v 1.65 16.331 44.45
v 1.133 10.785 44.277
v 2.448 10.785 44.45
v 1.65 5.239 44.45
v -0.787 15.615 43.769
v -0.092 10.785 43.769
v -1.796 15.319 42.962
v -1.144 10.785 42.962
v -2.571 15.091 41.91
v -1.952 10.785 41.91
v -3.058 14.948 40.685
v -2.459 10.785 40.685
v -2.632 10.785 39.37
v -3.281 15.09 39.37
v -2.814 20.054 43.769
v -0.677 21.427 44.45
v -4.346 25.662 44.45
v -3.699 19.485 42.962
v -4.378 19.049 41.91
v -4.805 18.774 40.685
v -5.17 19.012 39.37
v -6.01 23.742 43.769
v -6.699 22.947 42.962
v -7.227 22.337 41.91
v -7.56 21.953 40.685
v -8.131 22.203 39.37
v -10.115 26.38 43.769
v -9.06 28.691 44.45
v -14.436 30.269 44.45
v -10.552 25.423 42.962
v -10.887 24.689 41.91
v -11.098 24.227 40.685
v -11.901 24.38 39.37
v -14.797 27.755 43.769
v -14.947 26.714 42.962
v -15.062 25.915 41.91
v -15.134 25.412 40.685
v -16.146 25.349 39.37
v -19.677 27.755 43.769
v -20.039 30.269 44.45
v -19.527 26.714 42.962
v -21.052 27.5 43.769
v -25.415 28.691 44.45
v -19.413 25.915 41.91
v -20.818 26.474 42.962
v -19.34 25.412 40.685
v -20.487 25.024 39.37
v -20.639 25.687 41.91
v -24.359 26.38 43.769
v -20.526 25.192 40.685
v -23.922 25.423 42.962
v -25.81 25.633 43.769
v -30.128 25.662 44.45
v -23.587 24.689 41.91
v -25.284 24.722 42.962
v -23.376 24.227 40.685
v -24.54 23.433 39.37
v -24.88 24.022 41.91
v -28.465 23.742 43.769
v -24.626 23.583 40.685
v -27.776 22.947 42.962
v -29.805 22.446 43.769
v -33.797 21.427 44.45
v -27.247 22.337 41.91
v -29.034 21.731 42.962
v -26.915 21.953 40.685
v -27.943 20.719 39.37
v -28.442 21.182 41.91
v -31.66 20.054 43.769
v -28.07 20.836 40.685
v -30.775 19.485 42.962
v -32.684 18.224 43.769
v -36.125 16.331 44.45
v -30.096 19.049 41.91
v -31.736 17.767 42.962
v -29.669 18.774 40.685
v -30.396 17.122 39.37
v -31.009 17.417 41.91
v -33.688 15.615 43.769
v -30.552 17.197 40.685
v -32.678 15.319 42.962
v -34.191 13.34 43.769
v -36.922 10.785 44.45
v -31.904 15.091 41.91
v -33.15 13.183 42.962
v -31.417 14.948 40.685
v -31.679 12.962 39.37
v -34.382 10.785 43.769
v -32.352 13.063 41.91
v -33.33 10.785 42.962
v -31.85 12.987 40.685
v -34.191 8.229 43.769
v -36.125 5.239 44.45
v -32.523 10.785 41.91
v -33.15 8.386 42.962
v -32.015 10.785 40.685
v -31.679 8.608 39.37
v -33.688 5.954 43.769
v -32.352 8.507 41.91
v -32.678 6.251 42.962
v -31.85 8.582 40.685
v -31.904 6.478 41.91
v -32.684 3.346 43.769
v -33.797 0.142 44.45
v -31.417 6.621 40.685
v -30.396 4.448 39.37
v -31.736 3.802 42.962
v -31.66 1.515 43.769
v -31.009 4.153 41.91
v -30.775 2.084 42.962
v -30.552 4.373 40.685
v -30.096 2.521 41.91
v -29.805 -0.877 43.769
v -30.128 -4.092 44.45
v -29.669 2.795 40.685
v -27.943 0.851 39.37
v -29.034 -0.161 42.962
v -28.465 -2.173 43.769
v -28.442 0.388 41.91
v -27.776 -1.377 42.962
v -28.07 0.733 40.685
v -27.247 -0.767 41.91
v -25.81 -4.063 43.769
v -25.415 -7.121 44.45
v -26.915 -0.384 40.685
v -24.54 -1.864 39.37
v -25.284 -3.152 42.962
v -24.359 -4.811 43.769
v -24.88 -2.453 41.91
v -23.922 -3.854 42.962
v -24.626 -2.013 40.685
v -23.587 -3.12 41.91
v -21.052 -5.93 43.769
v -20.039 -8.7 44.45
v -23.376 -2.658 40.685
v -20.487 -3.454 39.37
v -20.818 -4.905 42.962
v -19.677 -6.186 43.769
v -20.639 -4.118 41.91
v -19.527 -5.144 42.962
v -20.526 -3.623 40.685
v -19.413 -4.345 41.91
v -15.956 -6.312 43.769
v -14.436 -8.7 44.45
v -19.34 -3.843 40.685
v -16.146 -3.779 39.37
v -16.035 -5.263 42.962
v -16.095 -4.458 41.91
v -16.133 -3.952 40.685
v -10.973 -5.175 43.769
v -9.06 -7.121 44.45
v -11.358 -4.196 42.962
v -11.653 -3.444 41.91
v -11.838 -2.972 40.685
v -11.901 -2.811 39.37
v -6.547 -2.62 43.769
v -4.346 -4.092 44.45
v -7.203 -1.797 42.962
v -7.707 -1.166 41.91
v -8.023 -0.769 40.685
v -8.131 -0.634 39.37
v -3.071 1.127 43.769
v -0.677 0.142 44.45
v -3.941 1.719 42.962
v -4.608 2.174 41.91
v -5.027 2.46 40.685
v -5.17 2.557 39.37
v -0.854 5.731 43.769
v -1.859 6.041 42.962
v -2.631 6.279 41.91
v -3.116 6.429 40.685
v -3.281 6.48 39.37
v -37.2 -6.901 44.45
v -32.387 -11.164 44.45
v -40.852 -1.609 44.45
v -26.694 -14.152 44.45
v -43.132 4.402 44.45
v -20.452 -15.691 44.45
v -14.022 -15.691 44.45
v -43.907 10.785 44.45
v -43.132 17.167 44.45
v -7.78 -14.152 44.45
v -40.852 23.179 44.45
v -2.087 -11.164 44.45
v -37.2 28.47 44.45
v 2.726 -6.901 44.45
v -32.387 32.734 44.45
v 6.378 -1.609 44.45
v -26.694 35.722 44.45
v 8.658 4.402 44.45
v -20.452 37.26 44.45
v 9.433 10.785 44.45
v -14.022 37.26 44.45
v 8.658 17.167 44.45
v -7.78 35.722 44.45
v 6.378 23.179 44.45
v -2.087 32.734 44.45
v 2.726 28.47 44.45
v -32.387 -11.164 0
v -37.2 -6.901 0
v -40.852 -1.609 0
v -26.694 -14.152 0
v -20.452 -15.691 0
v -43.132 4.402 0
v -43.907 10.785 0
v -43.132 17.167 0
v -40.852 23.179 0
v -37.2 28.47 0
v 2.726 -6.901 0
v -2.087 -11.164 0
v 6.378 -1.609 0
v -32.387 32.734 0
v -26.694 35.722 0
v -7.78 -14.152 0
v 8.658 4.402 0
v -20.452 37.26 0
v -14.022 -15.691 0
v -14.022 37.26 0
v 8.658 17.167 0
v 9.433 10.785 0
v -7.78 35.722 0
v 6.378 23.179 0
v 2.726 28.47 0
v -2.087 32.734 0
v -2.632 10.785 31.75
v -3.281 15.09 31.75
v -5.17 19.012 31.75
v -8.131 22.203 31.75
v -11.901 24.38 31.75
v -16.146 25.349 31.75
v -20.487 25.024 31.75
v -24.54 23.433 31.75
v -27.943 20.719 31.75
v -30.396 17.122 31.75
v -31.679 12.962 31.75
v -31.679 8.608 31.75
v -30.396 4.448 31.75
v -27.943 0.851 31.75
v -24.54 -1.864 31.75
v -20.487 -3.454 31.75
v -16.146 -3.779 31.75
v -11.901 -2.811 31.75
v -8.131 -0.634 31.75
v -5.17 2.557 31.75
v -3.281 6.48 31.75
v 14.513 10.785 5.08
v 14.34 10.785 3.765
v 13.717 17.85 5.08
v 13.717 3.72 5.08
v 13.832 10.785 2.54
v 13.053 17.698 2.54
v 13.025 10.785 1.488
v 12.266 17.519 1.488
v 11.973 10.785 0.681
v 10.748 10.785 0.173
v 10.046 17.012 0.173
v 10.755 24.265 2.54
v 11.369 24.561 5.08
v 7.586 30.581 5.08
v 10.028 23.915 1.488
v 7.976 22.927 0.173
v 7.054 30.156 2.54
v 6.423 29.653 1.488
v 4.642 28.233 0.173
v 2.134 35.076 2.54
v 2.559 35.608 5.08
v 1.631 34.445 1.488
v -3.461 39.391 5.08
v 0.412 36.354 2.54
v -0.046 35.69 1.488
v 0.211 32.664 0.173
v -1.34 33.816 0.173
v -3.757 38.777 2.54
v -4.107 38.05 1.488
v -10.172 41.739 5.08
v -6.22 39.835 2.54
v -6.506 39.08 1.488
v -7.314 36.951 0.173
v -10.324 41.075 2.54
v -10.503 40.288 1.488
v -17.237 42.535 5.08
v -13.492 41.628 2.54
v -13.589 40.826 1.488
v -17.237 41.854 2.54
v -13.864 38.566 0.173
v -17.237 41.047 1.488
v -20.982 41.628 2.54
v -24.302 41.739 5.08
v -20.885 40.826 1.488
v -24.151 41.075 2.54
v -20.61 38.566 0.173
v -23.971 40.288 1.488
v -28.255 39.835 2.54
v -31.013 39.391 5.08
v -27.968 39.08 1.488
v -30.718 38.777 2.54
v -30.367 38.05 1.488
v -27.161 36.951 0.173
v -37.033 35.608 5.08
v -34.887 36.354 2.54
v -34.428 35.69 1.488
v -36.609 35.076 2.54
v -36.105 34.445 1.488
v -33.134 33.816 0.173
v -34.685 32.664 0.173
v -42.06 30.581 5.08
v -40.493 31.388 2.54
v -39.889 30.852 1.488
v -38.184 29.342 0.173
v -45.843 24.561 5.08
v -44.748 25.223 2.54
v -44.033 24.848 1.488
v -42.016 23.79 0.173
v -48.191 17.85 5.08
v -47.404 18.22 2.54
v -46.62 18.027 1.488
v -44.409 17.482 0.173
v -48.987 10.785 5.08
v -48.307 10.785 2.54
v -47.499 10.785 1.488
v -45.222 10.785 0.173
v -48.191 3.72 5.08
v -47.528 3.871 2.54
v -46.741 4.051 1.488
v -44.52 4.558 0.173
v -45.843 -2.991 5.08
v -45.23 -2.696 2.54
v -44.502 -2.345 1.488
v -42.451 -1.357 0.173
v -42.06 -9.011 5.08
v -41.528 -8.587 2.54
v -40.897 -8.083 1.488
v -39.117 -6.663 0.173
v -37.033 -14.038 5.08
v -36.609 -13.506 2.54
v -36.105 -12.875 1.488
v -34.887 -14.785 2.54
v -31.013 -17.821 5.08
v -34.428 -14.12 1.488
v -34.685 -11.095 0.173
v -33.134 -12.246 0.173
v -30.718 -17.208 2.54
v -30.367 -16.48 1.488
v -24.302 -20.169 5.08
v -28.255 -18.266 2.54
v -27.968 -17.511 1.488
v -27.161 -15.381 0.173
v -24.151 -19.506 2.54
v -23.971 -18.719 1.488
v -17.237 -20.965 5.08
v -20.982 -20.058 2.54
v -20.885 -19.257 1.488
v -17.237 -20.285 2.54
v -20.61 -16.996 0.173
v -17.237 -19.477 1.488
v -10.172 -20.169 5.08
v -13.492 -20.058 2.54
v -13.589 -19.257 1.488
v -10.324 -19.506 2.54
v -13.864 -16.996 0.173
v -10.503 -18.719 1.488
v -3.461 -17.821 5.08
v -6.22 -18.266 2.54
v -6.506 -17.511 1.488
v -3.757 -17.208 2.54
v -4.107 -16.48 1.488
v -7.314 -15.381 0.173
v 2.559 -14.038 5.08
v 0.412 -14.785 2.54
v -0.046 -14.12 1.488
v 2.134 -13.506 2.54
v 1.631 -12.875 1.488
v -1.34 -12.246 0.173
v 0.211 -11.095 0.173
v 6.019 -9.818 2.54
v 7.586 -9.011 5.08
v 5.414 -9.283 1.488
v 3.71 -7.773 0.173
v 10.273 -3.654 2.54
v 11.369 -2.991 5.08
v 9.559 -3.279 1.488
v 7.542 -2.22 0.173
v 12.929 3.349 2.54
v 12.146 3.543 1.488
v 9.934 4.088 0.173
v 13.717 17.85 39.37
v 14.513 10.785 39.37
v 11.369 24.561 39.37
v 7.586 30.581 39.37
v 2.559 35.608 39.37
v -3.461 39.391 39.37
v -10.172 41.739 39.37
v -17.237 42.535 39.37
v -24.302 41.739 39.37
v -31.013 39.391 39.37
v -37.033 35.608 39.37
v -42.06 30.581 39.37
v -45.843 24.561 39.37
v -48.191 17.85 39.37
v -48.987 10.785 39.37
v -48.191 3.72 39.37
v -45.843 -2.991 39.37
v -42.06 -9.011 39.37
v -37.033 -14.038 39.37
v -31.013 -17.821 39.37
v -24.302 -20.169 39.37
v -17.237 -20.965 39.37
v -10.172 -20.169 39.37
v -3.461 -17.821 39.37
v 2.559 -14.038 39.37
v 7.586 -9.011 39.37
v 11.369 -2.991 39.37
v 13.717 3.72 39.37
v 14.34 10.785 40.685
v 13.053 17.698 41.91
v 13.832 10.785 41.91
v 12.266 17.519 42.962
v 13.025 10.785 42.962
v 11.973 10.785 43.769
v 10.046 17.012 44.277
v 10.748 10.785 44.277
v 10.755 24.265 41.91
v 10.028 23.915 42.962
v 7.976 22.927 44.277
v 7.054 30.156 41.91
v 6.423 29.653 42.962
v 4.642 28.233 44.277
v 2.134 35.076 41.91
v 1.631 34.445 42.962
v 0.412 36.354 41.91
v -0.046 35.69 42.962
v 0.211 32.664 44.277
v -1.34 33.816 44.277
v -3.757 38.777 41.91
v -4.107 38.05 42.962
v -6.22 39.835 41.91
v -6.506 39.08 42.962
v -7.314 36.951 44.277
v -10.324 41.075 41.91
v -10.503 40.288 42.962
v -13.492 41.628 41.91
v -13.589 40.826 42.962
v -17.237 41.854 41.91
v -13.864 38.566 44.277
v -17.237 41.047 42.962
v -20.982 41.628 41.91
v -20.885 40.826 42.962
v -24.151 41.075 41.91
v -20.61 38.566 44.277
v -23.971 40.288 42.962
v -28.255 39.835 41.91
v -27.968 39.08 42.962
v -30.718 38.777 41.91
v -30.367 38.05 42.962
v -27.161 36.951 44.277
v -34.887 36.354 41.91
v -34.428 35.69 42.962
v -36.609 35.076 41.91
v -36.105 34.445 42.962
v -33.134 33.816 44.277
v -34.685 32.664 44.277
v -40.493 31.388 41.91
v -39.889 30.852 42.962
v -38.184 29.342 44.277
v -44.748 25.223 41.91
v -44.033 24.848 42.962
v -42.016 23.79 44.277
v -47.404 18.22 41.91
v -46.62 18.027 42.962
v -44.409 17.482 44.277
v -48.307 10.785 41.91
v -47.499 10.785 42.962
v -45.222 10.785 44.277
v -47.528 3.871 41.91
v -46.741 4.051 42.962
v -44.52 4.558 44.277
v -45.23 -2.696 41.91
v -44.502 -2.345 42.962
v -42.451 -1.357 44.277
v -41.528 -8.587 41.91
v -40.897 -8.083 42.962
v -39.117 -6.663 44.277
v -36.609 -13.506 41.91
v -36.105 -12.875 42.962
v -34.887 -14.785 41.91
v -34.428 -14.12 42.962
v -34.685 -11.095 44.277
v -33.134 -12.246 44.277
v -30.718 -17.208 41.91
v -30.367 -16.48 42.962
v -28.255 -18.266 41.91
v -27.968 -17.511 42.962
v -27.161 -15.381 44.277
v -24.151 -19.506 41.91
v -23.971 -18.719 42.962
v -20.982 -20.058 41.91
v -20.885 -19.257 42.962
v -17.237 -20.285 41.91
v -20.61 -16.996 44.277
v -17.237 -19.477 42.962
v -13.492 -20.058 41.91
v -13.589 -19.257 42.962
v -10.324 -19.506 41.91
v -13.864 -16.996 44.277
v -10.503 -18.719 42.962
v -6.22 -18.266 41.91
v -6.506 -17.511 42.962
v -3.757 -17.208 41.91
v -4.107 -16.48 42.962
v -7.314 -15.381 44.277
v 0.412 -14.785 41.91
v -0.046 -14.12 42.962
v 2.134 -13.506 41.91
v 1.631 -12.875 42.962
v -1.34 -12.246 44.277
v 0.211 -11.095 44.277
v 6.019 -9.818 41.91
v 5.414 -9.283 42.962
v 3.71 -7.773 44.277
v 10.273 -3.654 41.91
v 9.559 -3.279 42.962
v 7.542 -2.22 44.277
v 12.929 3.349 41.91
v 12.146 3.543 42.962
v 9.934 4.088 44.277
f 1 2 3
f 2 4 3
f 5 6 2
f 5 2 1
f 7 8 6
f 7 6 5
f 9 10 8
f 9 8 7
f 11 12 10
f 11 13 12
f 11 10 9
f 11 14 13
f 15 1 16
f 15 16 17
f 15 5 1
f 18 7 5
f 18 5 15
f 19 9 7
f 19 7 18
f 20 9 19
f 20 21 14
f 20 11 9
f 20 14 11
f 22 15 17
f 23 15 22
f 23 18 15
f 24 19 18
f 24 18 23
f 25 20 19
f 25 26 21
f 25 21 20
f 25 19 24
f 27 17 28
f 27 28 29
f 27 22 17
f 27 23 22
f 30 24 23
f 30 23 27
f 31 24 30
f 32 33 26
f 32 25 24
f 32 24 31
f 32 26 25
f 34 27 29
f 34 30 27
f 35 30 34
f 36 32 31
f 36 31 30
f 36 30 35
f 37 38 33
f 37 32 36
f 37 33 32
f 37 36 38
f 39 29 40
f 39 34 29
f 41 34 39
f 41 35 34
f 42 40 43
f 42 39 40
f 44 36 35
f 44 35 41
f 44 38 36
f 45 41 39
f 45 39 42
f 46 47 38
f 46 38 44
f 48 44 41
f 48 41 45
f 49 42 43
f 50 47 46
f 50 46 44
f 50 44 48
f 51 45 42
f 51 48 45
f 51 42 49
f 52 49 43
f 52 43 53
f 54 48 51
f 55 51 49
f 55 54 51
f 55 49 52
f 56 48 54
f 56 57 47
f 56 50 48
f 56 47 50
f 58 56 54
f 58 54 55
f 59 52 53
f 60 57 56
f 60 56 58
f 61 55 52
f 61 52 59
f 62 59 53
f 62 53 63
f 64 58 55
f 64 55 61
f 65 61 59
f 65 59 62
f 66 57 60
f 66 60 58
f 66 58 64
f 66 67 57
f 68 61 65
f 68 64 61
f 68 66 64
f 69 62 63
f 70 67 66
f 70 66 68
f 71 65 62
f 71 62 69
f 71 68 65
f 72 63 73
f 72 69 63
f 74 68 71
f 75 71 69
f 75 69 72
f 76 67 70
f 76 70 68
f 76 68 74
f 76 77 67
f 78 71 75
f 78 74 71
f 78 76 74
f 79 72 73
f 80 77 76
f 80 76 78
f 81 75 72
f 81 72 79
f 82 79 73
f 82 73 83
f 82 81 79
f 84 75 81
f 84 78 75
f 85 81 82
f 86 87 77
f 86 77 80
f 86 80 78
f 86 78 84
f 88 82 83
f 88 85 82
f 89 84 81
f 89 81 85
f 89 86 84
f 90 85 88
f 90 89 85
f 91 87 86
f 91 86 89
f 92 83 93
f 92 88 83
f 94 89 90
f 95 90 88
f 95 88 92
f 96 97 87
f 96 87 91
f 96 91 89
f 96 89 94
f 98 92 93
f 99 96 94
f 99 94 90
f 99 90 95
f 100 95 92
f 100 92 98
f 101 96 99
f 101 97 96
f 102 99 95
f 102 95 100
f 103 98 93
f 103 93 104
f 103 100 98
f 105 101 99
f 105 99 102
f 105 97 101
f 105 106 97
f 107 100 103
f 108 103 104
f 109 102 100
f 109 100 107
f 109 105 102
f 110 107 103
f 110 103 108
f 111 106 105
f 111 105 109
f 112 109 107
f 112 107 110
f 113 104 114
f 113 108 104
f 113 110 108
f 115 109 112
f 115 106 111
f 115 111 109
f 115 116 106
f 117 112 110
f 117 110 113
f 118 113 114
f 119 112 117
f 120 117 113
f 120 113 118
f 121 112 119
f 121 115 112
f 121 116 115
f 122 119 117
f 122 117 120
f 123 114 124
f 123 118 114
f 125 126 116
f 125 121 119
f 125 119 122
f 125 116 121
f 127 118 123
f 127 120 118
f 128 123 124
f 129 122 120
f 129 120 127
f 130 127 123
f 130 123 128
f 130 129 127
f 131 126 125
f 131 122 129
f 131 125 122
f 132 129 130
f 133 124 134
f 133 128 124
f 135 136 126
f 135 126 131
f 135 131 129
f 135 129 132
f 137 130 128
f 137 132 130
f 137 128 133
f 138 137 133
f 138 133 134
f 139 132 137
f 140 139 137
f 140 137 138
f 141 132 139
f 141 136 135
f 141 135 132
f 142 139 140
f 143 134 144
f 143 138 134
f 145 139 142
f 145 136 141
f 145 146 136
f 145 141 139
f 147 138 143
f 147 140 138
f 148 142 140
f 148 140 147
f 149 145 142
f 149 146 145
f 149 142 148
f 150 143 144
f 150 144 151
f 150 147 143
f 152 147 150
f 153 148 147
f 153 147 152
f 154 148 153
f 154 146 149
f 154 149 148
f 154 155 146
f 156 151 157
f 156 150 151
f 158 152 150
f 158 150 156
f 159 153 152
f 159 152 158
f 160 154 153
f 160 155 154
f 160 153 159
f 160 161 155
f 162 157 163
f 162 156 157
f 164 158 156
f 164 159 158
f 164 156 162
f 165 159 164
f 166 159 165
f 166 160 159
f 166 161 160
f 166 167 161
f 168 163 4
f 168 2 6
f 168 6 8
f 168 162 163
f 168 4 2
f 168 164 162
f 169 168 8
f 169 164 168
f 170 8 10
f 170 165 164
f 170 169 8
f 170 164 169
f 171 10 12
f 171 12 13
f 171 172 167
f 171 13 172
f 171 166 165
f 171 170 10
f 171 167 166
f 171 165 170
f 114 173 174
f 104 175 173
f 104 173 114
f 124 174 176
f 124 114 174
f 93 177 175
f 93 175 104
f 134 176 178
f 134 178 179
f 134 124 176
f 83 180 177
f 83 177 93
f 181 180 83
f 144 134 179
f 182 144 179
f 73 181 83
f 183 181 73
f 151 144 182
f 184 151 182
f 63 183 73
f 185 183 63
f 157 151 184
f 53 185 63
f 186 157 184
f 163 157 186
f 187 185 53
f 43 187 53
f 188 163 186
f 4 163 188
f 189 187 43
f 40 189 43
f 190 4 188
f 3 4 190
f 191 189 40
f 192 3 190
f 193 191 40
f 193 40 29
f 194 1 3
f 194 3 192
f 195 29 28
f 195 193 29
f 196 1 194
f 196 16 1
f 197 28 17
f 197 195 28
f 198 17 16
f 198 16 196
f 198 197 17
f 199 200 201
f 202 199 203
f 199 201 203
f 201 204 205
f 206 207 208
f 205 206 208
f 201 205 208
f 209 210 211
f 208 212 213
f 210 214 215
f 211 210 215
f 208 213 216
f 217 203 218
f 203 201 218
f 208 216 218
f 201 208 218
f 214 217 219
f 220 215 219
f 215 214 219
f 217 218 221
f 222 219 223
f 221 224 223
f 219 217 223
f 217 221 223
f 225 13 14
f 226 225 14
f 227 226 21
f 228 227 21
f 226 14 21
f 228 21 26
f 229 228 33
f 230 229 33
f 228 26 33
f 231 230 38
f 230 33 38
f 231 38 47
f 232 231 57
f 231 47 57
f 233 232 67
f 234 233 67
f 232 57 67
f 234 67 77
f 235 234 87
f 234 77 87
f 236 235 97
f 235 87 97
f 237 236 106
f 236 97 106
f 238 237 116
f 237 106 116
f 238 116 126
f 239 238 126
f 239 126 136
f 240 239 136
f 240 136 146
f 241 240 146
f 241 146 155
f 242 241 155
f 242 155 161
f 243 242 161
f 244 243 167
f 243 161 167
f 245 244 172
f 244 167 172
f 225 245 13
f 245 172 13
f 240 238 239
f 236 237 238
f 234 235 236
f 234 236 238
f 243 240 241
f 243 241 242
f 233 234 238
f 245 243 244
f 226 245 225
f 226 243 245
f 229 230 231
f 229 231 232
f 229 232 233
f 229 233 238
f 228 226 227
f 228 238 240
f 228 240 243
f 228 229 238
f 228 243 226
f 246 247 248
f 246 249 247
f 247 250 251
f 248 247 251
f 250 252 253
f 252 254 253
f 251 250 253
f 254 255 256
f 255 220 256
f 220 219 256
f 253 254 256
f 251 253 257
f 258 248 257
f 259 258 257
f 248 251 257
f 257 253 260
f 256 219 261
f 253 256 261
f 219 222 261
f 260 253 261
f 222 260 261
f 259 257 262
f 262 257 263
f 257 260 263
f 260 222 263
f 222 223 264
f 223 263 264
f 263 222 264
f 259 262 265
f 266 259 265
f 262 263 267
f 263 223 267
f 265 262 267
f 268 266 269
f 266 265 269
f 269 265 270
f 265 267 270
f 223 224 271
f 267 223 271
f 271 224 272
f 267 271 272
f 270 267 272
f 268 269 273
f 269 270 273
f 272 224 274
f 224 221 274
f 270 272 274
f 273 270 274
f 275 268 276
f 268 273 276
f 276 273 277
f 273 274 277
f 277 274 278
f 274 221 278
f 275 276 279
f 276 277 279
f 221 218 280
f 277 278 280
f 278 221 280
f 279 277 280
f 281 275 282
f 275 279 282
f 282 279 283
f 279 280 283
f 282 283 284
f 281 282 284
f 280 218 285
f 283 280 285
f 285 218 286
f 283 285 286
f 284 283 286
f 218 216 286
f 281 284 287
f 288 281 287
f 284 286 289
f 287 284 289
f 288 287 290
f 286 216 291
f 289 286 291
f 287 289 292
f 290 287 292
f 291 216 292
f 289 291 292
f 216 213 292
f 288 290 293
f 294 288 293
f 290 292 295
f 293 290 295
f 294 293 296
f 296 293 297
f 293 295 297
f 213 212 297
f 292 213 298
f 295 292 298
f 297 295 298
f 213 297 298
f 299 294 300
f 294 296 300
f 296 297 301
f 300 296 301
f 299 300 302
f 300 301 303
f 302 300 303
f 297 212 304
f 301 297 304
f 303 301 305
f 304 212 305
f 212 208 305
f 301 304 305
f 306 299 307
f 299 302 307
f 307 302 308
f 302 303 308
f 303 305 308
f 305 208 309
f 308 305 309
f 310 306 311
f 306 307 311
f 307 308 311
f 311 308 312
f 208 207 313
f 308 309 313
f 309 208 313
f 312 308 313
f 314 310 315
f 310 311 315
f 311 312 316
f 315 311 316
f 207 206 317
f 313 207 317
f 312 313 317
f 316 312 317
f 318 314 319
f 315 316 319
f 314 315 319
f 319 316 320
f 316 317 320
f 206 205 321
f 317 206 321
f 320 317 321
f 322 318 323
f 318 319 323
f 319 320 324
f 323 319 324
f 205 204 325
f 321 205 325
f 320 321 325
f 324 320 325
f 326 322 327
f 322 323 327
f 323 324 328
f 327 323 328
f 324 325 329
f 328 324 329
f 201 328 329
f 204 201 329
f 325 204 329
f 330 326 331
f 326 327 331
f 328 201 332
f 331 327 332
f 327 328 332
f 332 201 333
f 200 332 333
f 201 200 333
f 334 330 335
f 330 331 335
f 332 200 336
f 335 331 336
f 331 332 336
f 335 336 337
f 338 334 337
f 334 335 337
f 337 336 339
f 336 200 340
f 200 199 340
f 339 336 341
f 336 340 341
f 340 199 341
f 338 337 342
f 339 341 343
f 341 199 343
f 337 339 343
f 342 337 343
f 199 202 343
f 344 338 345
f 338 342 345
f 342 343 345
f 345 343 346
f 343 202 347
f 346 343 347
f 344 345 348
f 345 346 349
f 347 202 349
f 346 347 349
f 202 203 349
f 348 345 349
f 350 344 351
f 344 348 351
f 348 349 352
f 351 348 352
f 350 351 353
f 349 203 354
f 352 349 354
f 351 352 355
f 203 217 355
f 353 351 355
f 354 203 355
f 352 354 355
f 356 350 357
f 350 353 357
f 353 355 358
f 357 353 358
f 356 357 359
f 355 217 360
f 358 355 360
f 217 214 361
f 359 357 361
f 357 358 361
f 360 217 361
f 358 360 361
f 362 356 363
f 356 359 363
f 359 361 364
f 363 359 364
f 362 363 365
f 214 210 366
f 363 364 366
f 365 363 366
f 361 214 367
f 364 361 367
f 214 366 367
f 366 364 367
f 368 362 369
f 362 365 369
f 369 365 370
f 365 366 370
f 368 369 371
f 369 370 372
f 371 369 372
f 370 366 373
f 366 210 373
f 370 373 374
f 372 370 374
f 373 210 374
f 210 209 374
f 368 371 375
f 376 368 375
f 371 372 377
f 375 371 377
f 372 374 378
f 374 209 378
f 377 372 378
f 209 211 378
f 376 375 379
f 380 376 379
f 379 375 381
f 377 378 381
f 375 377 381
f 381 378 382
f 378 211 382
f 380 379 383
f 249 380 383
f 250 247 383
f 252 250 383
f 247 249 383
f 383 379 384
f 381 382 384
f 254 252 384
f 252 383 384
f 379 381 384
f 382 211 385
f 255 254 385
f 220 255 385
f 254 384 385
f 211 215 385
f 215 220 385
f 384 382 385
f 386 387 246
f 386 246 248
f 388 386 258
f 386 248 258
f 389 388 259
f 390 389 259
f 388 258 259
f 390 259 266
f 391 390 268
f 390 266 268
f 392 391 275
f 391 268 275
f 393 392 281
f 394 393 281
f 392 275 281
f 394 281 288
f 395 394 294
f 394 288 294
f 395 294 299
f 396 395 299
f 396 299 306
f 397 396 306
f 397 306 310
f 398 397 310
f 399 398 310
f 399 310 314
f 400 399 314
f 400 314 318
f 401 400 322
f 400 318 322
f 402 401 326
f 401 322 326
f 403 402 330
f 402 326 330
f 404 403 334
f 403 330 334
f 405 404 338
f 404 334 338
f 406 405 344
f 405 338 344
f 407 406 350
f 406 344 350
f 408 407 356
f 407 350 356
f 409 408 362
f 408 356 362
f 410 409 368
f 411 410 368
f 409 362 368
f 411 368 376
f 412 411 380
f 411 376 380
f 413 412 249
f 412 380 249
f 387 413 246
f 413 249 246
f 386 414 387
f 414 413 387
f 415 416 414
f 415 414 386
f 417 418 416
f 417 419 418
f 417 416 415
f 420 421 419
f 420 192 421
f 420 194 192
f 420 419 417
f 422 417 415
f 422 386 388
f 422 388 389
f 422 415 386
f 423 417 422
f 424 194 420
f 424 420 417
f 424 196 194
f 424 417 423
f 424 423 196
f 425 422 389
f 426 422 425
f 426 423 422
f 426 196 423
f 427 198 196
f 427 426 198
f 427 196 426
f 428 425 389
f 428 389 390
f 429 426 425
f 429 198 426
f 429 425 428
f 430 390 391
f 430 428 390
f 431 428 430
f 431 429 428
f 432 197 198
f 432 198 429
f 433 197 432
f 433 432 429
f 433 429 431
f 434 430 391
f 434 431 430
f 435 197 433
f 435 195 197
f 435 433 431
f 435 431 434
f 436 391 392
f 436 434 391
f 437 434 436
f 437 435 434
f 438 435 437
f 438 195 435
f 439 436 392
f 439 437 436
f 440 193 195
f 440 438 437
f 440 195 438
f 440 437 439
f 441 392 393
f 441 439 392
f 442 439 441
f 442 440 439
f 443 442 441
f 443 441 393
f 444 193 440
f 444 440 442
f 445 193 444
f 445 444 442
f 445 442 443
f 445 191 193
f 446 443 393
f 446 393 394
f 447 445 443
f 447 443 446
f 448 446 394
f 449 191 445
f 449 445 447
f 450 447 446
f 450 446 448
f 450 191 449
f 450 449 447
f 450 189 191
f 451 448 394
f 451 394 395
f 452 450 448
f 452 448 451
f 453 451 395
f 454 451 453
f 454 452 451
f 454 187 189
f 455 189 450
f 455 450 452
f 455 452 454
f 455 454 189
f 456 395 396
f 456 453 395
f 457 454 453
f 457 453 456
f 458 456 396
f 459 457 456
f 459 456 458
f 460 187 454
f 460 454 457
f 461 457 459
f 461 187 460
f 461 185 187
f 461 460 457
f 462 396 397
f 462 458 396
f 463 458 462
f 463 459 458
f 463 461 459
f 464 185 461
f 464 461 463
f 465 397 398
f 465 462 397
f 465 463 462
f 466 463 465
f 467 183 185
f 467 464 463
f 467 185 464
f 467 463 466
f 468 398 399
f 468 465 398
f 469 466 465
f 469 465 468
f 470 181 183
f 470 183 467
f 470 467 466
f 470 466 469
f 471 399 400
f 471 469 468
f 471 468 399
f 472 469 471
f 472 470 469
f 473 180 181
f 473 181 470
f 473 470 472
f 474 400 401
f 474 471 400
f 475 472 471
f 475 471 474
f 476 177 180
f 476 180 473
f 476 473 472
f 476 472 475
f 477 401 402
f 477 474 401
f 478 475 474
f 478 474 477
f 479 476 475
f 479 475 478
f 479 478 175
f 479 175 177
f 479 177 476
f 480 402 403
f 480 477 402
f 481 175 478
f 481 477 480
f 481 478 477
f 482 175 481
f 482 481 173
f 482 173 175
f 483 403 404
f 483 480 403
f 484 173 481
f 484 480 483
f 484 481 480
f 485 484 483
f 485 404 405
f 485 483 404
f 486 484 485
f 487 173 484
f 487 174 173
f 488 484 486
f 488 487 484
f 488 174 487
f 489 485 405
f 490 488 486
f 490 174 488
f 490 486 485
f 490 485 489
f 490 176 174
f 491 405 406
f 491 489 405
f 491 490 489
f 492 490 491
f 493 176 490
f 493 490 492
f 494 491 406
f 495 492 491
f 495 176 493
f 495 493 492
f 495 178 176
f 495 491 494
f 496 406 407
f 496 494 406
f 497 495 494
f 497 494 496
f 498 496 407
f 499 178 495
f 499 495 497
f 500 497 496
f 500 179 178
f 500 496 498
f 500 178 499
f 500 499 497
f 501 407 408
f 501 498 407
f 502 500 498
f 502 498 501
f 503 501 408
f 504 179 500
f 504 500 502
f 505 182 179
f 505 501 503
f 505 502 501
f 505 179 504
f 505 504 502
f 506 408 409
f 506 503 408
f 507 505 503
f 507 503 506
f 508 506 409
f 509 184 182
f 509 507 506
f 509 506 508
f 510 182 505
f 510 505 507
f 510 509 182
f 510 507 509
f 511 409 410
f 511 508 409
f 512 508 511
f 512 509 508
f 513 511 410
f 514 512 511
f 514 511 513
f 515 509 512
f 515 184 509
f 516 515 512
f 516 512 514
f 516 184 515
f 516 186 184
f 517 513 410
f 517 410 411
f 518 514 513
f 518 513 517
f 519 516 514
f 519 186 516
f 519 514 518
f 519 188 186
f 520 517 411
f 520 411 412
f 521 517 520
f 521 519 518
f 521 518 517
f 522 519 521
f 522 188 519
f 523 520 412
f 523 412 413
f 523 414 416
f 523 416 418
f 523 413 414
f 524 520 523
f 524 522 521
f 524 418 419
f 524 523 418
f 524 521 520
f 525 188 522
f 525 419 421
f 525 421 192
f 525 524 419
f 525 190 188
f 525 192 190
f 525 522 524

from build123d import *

# Parameters (mm, degrees)
F0_R     = 31.75
F1_DEPTH = 44.45
F2_R     = 14.605
F3_DEPTH = 12.7
F4_R     = 5.08


with BuildPart() as f1:
    # F0 (on Top) → F1 (new body)
    with BuildSketch(Plane.XY):
        with Locations((-17.237177, 10.784758)):
            Circle(F0_R)
    extrude(amount=F1_DEPTH)

    # F2 (on face) → F3 (cut)
    with BuildSketch(Plane.XY.offset(44.45)):
        with Locations((-17.237177, 10.784758)):
            Circle(F2_R)
    extrude(amount=-F3_DEPTH, mode=Mode.SUBTRACT)

    # F4
    f4_edges = [f1.edges().sort_by_distance(p)[0] for p in [
        (-48.987177, 10.784758, 44.45),
        (-48.987177, 10.784758, 0),
        (-31.842177, 10.784758, 44.45),
    ]]
    fillet(f4_edges, radius=F4_R)


solid = f1.part
